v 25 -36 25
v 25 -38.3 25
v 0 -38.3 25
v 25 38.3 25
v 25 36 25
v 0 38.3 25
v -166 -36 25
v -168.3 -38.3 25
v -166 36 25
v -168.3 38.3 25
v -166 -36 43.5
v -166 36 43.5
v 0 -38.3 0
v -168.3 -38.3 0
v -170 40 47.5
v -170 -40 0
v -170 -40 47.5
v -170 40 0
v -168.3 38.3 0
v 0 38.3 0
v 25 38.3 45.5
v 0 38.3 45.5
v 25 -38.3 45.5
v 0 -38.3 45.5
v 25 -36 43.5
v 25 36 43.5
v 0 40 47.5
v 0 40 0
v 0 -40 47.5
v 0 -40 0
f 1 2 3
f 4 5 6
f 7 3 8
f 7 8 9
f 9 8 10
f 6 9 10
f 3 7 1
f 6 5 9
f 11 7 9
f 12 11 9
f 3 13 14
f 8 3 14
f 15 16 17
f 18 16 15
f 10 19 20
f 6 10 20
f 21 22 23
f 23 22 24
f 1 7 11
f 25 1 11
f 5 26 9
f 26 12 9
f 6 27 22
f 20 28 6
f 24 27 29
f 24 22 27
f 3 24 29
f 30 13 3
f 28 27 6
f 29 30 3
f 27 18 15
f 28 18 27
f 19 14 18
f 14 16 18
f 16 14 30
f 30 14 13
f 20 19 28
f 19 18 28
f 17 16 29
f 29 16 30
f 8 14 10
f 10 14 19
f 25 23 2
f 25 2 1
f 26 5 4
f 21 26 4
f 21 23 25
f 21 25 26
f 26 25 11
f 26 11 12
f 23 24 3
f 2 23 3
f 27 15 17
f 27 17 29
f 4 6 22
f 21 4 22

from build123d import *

# Parameters (mm, degrees)
F1_DEPTH  = 43.5
F2_W      = 170
F2_H      = 80
F3_DEPTH  = 4
F5_DEPTH  = 25
F6_W      = 25
F6_H      = 2
F7_DEPTH  = 43.5
F9_DEPTH  = 25
F10_W     = 25
F10_H     = 0.3
F11_DEPTH = 18.5
F12_W     = 25
F12_H     = 2.3
F12_H_2   = 2
F13_DEPTH = 18.5
F15_DEPTH = 25


with BuildPart() as f1:
    # F0 (on Top) → F1 (new body)
    with BuildSketch(Plane.XY):
        Polygon((-166, 0), (-166, 36), (0, 36), (0, 40), (-170, 40), (-170, -40), (0, -40), (0, -36), (-166, -36), align=None)
    extrude(amount=F1_DEPTH)

    # F2 (on face) → F3 (join)
    with BuildSketch(Plane.XY.offset(43.5)):
        with Locations((-85, 0)):
            Rectangle(F2_W, F2_H)
    extrude(amount=F3_DEPTH)

    # F4 (on face) → F5 (cut)
    with BuildSketch(Plane.XY):
        Polygon((0, -36), (-166, -36), (-166, 0), (-166, 36), (0, 36), (0, 38), (-168, 38), (-168, -38), (0, -38), align=None)
    extrude(amount=F5_DEPTH, mode=Mode.SUBTRACT)

    # F6 (on face) → F7 (cut)
    with BuildSketch(Plane.XY):
        with Locations((-12.5, -37)):
            Rectangle(F6_W, F6_H)
        with Locations((-12.5, 37)):
            Rectangle(F6_W, F6_H)
    extrude(amount=F7_DEPTH, mode=Mode.SUBTRACT)

    # F8 (on face) → F9 (cut)
    with BuildSketch(Plane(origin=(0, 0, 0), x_dir=(1, 0, 0), z_dir=(0, 0, -1))):
        Polygon((-168, -38), (-168, 38), (0, 38), (0, 38.3), (-168.3, 38.3), (-168.3, -38.3), (0, -38.3), (0, -38), align=None)
    extrude(amount=-F9_DEPTH, mode=Mode.SUBTRACT)

    # F10 (on face) → F11 (cut)
    with BuildSketch(Plane(origin=(0, 0, 25), x_dir=(1, 0, 0), z_dir=(0, 0, -1))):
        with Locations((-12.5, 38.15)):
            Rectangle(F10_W, F10_H)
    extrude(amount=-F11_DEPTH, mode=Mode.SUBTRACT)

    # F12 (on face) → F13 (join)
    with BuildSketch(Plane(origin=(0, 0, 25), x_dir=(1, 0, 0), z_dir=(0, 0, -1))):
        with Locations((-12.5, 37.15)):
            Rectangle(F12_W, F12_H)
        with Locations((-12.5, -37)):
            Rectangle(F12_W, F12_H_2)
    extrude(amount=-F13_DEPTH)

    # F14 (on face) → F15 (join)
    with BuildSketch(Plane.YZ):
        Polygon((-36, 43.5), (36, 43.5), (36, 25), (38.3, 25), (38.3, 45.5), (-38.3, 45.5), (-38.3, 25), (-36, 25), align=None)
    extrude(amount=F15_DEPTH)


solid = f1.part
